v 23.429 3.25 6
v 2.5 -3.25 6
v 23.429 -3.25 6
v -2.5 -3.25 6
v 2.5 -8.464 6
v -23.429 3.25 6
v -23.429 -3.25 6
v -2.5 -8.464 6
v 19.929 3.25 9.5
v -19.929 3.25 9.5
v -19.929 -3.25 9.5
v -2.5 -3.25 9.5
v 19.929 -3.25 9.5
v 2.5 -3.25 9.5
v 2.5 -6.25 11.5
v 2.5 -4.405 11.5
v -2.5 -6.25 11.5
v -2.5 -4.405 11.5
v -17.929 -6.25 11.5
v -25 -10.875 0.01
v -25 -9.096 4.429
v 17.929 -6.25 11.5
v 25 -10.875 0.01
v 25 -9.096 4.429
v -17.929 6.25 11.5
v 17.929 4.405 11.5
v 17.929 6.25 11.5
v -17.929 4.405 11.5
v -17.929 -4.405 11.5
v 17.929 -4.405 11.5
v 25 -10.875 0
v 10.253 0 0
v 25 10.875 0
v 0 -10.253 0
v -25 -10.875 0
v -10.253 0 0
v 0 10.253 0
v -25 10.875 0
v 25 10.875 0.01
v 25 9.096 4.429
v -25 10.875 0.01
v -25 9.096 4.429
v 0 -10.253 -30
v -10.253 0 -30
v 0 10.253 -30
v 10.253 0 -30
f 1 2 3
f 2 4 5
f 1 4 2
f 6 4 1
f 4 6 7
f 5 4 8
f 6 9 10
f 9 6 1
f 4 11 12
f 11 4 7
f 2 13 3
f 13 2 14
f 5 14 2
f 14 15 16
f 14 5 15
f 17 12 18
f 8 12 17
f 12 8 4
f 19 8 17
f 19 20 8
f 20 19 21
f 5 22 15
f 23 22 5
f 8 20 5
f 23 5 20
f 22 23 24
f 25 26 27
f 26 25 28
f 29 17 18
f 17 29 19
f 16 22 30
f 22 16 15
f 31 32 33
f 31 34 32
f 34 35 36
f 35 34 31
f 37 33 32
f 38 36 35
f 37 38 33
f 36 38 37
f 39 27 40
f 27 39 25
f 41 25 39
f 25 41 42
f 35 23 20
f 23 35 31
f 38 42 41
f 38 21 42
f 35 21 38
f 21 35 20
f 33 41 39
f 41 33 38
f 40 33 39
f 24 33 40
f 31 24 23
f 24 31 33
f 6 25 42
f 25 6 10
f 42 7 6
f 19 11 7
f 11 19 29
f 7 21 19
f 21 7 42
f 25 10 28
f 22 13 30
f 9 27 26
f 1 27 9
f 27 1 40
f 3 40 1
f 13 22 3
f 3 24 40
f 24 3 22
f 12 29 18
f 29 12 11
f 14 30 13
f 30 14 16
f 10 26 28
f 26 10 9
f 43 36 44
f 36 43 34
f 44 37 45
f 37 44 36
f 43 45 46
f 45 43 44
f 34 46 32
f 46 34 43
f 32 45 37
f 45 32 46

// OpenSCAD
// Arbor press adapter for IDC connectors

TYPE = "sqaure"; // ["round", "sqaure"]

PEG = 14.5;
PEG_LENGTH = 30;

IDC_X = 50;
IDC_Y = 6.5;
IDC_Z = 9.5 - 4;
IDC_PEG_X = 4.4 + 0.6;

WALL = 3;
LIFT = 3;

IDC_Y_OUTSIDE = WALL + IDC_Y + WALL;
t = 0.01;
$fn = 50;

if (TYPE == "round") {
    translate([0,0,-PEG_LENGTH/2]) rotate([0,0,45]) cylinder(d=PEG, h=PEG_LENGTH, center=true);
} else {
    translate([0,0,-PEG_LENGTH/2]) rotate([0,0,45]) cube([PEG, PEG, PEG_LENGTH], center=true);
}

difference() {
    bw = PEG * 1.5;
    
//    // Body
    hull() {
        translate([-IDC_X/2, -bw/2, 0]) cube([IDC_X, bw, t]);
        translate([-IDC_X/2, -IDC_Y_OUTSIDE/2, 0]) cube([IDC_X, IDC_Y_OUTSIDE, LIFT + WALL + IDC_Z]);
    }
    
    // Chamfer edges
    // Ends
    translate([-IDC_X/2, 0, LIFT + WALL + IDC_Z]) rotate([0,45,0]) cube([10, bw, 10], center=true);
    translate([IDC_X/2, 0, LIFT + WALL + IDC_Z]) rotate([0,45,0]) cube([10, bw, 10], center=true);

    // Inside
    translate([0, -IDC_Y/2, LIFT + WALL + IDC_Z]) rotate([30,0,0]) cube([IDC_X,2,5], center=true);
    translate([0, IDC_Y/2, LIFT + WALL + IDC_Z]) rotate([-30,0,0]) cube([IDC_X,2,5], center=true);


    // Connector mask
    translate([0,0, LIFT]) {
        // Connector mask
        translate([-IDC_X/2 - t, -IDC_Y/2, WALL]) cube([IDC_X + 2*t, IDC_Y, IDC_Z + t]);
        
        // Connector peg mask
        translate([-IDC_PEG_X/2, -bw/2, WALL]) cube([IDC_PEG_X, bw/2, IDC_Z + t]);
    }
}
